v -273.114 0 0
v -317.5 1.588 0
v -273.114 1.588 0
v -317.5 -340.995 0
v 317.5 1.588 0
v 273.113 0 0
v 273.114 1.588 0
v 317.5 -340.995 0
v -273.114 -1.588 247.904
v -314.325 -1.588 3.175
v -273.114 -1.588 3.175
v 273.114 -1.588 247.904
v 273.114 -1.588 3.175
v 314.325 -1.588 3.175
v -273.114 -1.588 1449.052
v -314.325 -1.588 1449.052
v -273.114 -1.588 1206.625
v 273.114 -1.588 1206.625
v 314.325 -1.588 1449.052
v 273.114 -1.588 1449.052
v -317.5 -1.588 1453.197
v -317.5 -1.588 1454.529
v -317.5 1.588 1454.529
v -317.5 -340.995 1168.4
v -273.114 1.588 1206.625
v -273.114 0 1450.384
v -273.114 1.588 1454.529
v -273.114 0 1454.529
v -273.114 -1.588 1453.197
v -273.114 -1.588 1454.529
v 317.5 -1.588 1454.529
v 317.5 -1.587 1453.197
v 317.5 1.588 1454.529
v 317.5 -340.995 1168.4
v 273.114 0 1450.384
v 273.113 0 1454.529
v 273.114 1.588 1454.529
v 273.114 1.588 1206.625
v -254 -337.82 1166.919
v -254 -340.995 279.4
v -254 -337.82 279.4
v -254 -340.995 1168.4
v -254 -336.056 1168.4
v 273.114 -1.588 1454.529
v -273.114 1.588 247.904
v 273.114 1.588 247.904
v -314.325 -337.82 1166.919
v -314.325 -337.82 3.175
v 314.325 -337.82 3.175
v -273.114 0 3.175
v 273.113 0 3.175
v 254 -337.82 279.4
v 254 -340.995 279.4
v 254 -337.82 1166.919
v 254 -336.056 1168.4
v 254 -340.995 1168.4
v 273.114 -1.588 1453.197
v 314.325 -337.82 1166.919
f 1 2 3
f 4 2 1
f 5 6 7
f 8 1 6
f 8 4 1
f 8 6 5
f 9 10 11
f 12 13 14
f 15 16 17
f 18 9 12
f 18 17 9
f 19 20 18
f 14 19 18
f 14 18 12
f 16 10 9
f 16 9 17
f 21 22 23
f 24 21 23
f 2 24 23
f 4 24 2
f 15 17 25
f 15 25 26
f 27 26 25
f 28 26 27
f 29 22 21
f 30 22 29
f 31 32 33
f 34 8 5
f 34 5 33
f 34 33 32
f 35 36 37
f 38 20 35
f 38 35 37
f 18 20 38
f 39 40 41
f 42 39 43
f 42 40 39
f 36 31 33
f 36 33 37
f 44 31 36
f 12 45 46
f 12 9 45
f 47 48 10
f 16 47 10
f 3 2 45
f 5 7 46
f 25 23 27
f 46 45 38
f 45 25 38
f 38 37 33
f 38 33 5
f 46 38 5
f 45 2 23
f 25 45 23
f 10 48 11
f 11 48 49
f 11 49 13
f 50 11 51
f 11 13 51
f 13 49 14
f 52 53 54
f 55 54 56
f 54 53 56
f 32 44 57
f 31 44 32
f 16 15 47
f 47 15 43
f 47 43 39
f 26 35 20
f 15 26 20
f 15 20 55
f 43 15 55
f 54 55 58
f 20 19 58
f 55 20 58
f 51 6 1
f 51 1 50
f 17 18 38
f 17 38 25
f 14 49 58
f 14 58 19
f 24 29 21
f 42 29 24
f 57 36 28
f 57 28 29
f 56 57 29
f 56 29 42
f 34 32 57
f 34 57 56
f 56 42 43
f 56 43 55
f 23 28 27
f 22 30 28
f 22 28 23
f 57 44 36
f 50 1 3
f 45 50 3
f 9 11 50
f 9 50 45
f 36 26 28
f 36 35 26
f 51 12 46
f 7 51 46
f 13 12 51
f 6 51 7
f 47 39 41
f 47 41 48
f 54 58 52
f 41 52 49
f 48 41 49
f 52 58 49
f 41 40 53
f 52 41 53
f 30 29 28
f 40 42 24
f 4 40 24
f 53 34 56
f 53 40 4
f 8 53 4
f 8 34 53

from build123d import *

# Parameters (mm, degrees)
F1_DEPTH = 317.5
F2_T     = -3.175
F4_DEPTH = 1.5875
F5_W     = 508
F5_H     = 889
F6_DEPTH = 4.9404231503


with BuildPart() as f1:
    # F0 (on Right) → F1 (new body, symmetric)
    with BuildSketch(Plane.YZ):
        Polygon((-340.995, 0), (0, 0), (0, 1454.5287787333), (-340.995, 1168.4), align=None)
    extrude(amount=F1_DEPTH, both=True)

    # F2
    f2_openings = [f1.faces().sort_by_distance(p)[0] for p in [
        (0, 0, 727.264389),
    ]]
    offset(amount=F2_T, openings=f2_openings)

    # F3 (on Front) → F4 (join, symmetric)
    with BuildSketch(Plane.XZ):
        Polygon((-273.1135, 247.904), (273.1135, 247.904), (273.1135, 0), (317.5, 0), (317.5, 247.904), (317.5, 1206.6247787333), (317.5, 1454.5287787333), (273.1135, 1454.5287787333), (273.1135, 1206.6247787333), (-273.1135, 1206.6247787333), (-273.1135, 1454.5287787333), (-317.5, 1454.5287787333), (-317.5, 1206.6247787333), (-317.5, 247.904), (-317.5, 0), (-273.1135, 0), align=None)
    extrude(amount=F4_DEPTH, both=True)

    # F5 (on face) → F6 (cut, through all)
    with BuildSketch(Plane.XZ.offset(340.995)):
        with Locations((0, 723.9)):
            Rectangle(F5_W, F5_H)
    extrude(amount=-F6_DEPTH, mode=Mode.SUBTRACT)


solid = f1.part
